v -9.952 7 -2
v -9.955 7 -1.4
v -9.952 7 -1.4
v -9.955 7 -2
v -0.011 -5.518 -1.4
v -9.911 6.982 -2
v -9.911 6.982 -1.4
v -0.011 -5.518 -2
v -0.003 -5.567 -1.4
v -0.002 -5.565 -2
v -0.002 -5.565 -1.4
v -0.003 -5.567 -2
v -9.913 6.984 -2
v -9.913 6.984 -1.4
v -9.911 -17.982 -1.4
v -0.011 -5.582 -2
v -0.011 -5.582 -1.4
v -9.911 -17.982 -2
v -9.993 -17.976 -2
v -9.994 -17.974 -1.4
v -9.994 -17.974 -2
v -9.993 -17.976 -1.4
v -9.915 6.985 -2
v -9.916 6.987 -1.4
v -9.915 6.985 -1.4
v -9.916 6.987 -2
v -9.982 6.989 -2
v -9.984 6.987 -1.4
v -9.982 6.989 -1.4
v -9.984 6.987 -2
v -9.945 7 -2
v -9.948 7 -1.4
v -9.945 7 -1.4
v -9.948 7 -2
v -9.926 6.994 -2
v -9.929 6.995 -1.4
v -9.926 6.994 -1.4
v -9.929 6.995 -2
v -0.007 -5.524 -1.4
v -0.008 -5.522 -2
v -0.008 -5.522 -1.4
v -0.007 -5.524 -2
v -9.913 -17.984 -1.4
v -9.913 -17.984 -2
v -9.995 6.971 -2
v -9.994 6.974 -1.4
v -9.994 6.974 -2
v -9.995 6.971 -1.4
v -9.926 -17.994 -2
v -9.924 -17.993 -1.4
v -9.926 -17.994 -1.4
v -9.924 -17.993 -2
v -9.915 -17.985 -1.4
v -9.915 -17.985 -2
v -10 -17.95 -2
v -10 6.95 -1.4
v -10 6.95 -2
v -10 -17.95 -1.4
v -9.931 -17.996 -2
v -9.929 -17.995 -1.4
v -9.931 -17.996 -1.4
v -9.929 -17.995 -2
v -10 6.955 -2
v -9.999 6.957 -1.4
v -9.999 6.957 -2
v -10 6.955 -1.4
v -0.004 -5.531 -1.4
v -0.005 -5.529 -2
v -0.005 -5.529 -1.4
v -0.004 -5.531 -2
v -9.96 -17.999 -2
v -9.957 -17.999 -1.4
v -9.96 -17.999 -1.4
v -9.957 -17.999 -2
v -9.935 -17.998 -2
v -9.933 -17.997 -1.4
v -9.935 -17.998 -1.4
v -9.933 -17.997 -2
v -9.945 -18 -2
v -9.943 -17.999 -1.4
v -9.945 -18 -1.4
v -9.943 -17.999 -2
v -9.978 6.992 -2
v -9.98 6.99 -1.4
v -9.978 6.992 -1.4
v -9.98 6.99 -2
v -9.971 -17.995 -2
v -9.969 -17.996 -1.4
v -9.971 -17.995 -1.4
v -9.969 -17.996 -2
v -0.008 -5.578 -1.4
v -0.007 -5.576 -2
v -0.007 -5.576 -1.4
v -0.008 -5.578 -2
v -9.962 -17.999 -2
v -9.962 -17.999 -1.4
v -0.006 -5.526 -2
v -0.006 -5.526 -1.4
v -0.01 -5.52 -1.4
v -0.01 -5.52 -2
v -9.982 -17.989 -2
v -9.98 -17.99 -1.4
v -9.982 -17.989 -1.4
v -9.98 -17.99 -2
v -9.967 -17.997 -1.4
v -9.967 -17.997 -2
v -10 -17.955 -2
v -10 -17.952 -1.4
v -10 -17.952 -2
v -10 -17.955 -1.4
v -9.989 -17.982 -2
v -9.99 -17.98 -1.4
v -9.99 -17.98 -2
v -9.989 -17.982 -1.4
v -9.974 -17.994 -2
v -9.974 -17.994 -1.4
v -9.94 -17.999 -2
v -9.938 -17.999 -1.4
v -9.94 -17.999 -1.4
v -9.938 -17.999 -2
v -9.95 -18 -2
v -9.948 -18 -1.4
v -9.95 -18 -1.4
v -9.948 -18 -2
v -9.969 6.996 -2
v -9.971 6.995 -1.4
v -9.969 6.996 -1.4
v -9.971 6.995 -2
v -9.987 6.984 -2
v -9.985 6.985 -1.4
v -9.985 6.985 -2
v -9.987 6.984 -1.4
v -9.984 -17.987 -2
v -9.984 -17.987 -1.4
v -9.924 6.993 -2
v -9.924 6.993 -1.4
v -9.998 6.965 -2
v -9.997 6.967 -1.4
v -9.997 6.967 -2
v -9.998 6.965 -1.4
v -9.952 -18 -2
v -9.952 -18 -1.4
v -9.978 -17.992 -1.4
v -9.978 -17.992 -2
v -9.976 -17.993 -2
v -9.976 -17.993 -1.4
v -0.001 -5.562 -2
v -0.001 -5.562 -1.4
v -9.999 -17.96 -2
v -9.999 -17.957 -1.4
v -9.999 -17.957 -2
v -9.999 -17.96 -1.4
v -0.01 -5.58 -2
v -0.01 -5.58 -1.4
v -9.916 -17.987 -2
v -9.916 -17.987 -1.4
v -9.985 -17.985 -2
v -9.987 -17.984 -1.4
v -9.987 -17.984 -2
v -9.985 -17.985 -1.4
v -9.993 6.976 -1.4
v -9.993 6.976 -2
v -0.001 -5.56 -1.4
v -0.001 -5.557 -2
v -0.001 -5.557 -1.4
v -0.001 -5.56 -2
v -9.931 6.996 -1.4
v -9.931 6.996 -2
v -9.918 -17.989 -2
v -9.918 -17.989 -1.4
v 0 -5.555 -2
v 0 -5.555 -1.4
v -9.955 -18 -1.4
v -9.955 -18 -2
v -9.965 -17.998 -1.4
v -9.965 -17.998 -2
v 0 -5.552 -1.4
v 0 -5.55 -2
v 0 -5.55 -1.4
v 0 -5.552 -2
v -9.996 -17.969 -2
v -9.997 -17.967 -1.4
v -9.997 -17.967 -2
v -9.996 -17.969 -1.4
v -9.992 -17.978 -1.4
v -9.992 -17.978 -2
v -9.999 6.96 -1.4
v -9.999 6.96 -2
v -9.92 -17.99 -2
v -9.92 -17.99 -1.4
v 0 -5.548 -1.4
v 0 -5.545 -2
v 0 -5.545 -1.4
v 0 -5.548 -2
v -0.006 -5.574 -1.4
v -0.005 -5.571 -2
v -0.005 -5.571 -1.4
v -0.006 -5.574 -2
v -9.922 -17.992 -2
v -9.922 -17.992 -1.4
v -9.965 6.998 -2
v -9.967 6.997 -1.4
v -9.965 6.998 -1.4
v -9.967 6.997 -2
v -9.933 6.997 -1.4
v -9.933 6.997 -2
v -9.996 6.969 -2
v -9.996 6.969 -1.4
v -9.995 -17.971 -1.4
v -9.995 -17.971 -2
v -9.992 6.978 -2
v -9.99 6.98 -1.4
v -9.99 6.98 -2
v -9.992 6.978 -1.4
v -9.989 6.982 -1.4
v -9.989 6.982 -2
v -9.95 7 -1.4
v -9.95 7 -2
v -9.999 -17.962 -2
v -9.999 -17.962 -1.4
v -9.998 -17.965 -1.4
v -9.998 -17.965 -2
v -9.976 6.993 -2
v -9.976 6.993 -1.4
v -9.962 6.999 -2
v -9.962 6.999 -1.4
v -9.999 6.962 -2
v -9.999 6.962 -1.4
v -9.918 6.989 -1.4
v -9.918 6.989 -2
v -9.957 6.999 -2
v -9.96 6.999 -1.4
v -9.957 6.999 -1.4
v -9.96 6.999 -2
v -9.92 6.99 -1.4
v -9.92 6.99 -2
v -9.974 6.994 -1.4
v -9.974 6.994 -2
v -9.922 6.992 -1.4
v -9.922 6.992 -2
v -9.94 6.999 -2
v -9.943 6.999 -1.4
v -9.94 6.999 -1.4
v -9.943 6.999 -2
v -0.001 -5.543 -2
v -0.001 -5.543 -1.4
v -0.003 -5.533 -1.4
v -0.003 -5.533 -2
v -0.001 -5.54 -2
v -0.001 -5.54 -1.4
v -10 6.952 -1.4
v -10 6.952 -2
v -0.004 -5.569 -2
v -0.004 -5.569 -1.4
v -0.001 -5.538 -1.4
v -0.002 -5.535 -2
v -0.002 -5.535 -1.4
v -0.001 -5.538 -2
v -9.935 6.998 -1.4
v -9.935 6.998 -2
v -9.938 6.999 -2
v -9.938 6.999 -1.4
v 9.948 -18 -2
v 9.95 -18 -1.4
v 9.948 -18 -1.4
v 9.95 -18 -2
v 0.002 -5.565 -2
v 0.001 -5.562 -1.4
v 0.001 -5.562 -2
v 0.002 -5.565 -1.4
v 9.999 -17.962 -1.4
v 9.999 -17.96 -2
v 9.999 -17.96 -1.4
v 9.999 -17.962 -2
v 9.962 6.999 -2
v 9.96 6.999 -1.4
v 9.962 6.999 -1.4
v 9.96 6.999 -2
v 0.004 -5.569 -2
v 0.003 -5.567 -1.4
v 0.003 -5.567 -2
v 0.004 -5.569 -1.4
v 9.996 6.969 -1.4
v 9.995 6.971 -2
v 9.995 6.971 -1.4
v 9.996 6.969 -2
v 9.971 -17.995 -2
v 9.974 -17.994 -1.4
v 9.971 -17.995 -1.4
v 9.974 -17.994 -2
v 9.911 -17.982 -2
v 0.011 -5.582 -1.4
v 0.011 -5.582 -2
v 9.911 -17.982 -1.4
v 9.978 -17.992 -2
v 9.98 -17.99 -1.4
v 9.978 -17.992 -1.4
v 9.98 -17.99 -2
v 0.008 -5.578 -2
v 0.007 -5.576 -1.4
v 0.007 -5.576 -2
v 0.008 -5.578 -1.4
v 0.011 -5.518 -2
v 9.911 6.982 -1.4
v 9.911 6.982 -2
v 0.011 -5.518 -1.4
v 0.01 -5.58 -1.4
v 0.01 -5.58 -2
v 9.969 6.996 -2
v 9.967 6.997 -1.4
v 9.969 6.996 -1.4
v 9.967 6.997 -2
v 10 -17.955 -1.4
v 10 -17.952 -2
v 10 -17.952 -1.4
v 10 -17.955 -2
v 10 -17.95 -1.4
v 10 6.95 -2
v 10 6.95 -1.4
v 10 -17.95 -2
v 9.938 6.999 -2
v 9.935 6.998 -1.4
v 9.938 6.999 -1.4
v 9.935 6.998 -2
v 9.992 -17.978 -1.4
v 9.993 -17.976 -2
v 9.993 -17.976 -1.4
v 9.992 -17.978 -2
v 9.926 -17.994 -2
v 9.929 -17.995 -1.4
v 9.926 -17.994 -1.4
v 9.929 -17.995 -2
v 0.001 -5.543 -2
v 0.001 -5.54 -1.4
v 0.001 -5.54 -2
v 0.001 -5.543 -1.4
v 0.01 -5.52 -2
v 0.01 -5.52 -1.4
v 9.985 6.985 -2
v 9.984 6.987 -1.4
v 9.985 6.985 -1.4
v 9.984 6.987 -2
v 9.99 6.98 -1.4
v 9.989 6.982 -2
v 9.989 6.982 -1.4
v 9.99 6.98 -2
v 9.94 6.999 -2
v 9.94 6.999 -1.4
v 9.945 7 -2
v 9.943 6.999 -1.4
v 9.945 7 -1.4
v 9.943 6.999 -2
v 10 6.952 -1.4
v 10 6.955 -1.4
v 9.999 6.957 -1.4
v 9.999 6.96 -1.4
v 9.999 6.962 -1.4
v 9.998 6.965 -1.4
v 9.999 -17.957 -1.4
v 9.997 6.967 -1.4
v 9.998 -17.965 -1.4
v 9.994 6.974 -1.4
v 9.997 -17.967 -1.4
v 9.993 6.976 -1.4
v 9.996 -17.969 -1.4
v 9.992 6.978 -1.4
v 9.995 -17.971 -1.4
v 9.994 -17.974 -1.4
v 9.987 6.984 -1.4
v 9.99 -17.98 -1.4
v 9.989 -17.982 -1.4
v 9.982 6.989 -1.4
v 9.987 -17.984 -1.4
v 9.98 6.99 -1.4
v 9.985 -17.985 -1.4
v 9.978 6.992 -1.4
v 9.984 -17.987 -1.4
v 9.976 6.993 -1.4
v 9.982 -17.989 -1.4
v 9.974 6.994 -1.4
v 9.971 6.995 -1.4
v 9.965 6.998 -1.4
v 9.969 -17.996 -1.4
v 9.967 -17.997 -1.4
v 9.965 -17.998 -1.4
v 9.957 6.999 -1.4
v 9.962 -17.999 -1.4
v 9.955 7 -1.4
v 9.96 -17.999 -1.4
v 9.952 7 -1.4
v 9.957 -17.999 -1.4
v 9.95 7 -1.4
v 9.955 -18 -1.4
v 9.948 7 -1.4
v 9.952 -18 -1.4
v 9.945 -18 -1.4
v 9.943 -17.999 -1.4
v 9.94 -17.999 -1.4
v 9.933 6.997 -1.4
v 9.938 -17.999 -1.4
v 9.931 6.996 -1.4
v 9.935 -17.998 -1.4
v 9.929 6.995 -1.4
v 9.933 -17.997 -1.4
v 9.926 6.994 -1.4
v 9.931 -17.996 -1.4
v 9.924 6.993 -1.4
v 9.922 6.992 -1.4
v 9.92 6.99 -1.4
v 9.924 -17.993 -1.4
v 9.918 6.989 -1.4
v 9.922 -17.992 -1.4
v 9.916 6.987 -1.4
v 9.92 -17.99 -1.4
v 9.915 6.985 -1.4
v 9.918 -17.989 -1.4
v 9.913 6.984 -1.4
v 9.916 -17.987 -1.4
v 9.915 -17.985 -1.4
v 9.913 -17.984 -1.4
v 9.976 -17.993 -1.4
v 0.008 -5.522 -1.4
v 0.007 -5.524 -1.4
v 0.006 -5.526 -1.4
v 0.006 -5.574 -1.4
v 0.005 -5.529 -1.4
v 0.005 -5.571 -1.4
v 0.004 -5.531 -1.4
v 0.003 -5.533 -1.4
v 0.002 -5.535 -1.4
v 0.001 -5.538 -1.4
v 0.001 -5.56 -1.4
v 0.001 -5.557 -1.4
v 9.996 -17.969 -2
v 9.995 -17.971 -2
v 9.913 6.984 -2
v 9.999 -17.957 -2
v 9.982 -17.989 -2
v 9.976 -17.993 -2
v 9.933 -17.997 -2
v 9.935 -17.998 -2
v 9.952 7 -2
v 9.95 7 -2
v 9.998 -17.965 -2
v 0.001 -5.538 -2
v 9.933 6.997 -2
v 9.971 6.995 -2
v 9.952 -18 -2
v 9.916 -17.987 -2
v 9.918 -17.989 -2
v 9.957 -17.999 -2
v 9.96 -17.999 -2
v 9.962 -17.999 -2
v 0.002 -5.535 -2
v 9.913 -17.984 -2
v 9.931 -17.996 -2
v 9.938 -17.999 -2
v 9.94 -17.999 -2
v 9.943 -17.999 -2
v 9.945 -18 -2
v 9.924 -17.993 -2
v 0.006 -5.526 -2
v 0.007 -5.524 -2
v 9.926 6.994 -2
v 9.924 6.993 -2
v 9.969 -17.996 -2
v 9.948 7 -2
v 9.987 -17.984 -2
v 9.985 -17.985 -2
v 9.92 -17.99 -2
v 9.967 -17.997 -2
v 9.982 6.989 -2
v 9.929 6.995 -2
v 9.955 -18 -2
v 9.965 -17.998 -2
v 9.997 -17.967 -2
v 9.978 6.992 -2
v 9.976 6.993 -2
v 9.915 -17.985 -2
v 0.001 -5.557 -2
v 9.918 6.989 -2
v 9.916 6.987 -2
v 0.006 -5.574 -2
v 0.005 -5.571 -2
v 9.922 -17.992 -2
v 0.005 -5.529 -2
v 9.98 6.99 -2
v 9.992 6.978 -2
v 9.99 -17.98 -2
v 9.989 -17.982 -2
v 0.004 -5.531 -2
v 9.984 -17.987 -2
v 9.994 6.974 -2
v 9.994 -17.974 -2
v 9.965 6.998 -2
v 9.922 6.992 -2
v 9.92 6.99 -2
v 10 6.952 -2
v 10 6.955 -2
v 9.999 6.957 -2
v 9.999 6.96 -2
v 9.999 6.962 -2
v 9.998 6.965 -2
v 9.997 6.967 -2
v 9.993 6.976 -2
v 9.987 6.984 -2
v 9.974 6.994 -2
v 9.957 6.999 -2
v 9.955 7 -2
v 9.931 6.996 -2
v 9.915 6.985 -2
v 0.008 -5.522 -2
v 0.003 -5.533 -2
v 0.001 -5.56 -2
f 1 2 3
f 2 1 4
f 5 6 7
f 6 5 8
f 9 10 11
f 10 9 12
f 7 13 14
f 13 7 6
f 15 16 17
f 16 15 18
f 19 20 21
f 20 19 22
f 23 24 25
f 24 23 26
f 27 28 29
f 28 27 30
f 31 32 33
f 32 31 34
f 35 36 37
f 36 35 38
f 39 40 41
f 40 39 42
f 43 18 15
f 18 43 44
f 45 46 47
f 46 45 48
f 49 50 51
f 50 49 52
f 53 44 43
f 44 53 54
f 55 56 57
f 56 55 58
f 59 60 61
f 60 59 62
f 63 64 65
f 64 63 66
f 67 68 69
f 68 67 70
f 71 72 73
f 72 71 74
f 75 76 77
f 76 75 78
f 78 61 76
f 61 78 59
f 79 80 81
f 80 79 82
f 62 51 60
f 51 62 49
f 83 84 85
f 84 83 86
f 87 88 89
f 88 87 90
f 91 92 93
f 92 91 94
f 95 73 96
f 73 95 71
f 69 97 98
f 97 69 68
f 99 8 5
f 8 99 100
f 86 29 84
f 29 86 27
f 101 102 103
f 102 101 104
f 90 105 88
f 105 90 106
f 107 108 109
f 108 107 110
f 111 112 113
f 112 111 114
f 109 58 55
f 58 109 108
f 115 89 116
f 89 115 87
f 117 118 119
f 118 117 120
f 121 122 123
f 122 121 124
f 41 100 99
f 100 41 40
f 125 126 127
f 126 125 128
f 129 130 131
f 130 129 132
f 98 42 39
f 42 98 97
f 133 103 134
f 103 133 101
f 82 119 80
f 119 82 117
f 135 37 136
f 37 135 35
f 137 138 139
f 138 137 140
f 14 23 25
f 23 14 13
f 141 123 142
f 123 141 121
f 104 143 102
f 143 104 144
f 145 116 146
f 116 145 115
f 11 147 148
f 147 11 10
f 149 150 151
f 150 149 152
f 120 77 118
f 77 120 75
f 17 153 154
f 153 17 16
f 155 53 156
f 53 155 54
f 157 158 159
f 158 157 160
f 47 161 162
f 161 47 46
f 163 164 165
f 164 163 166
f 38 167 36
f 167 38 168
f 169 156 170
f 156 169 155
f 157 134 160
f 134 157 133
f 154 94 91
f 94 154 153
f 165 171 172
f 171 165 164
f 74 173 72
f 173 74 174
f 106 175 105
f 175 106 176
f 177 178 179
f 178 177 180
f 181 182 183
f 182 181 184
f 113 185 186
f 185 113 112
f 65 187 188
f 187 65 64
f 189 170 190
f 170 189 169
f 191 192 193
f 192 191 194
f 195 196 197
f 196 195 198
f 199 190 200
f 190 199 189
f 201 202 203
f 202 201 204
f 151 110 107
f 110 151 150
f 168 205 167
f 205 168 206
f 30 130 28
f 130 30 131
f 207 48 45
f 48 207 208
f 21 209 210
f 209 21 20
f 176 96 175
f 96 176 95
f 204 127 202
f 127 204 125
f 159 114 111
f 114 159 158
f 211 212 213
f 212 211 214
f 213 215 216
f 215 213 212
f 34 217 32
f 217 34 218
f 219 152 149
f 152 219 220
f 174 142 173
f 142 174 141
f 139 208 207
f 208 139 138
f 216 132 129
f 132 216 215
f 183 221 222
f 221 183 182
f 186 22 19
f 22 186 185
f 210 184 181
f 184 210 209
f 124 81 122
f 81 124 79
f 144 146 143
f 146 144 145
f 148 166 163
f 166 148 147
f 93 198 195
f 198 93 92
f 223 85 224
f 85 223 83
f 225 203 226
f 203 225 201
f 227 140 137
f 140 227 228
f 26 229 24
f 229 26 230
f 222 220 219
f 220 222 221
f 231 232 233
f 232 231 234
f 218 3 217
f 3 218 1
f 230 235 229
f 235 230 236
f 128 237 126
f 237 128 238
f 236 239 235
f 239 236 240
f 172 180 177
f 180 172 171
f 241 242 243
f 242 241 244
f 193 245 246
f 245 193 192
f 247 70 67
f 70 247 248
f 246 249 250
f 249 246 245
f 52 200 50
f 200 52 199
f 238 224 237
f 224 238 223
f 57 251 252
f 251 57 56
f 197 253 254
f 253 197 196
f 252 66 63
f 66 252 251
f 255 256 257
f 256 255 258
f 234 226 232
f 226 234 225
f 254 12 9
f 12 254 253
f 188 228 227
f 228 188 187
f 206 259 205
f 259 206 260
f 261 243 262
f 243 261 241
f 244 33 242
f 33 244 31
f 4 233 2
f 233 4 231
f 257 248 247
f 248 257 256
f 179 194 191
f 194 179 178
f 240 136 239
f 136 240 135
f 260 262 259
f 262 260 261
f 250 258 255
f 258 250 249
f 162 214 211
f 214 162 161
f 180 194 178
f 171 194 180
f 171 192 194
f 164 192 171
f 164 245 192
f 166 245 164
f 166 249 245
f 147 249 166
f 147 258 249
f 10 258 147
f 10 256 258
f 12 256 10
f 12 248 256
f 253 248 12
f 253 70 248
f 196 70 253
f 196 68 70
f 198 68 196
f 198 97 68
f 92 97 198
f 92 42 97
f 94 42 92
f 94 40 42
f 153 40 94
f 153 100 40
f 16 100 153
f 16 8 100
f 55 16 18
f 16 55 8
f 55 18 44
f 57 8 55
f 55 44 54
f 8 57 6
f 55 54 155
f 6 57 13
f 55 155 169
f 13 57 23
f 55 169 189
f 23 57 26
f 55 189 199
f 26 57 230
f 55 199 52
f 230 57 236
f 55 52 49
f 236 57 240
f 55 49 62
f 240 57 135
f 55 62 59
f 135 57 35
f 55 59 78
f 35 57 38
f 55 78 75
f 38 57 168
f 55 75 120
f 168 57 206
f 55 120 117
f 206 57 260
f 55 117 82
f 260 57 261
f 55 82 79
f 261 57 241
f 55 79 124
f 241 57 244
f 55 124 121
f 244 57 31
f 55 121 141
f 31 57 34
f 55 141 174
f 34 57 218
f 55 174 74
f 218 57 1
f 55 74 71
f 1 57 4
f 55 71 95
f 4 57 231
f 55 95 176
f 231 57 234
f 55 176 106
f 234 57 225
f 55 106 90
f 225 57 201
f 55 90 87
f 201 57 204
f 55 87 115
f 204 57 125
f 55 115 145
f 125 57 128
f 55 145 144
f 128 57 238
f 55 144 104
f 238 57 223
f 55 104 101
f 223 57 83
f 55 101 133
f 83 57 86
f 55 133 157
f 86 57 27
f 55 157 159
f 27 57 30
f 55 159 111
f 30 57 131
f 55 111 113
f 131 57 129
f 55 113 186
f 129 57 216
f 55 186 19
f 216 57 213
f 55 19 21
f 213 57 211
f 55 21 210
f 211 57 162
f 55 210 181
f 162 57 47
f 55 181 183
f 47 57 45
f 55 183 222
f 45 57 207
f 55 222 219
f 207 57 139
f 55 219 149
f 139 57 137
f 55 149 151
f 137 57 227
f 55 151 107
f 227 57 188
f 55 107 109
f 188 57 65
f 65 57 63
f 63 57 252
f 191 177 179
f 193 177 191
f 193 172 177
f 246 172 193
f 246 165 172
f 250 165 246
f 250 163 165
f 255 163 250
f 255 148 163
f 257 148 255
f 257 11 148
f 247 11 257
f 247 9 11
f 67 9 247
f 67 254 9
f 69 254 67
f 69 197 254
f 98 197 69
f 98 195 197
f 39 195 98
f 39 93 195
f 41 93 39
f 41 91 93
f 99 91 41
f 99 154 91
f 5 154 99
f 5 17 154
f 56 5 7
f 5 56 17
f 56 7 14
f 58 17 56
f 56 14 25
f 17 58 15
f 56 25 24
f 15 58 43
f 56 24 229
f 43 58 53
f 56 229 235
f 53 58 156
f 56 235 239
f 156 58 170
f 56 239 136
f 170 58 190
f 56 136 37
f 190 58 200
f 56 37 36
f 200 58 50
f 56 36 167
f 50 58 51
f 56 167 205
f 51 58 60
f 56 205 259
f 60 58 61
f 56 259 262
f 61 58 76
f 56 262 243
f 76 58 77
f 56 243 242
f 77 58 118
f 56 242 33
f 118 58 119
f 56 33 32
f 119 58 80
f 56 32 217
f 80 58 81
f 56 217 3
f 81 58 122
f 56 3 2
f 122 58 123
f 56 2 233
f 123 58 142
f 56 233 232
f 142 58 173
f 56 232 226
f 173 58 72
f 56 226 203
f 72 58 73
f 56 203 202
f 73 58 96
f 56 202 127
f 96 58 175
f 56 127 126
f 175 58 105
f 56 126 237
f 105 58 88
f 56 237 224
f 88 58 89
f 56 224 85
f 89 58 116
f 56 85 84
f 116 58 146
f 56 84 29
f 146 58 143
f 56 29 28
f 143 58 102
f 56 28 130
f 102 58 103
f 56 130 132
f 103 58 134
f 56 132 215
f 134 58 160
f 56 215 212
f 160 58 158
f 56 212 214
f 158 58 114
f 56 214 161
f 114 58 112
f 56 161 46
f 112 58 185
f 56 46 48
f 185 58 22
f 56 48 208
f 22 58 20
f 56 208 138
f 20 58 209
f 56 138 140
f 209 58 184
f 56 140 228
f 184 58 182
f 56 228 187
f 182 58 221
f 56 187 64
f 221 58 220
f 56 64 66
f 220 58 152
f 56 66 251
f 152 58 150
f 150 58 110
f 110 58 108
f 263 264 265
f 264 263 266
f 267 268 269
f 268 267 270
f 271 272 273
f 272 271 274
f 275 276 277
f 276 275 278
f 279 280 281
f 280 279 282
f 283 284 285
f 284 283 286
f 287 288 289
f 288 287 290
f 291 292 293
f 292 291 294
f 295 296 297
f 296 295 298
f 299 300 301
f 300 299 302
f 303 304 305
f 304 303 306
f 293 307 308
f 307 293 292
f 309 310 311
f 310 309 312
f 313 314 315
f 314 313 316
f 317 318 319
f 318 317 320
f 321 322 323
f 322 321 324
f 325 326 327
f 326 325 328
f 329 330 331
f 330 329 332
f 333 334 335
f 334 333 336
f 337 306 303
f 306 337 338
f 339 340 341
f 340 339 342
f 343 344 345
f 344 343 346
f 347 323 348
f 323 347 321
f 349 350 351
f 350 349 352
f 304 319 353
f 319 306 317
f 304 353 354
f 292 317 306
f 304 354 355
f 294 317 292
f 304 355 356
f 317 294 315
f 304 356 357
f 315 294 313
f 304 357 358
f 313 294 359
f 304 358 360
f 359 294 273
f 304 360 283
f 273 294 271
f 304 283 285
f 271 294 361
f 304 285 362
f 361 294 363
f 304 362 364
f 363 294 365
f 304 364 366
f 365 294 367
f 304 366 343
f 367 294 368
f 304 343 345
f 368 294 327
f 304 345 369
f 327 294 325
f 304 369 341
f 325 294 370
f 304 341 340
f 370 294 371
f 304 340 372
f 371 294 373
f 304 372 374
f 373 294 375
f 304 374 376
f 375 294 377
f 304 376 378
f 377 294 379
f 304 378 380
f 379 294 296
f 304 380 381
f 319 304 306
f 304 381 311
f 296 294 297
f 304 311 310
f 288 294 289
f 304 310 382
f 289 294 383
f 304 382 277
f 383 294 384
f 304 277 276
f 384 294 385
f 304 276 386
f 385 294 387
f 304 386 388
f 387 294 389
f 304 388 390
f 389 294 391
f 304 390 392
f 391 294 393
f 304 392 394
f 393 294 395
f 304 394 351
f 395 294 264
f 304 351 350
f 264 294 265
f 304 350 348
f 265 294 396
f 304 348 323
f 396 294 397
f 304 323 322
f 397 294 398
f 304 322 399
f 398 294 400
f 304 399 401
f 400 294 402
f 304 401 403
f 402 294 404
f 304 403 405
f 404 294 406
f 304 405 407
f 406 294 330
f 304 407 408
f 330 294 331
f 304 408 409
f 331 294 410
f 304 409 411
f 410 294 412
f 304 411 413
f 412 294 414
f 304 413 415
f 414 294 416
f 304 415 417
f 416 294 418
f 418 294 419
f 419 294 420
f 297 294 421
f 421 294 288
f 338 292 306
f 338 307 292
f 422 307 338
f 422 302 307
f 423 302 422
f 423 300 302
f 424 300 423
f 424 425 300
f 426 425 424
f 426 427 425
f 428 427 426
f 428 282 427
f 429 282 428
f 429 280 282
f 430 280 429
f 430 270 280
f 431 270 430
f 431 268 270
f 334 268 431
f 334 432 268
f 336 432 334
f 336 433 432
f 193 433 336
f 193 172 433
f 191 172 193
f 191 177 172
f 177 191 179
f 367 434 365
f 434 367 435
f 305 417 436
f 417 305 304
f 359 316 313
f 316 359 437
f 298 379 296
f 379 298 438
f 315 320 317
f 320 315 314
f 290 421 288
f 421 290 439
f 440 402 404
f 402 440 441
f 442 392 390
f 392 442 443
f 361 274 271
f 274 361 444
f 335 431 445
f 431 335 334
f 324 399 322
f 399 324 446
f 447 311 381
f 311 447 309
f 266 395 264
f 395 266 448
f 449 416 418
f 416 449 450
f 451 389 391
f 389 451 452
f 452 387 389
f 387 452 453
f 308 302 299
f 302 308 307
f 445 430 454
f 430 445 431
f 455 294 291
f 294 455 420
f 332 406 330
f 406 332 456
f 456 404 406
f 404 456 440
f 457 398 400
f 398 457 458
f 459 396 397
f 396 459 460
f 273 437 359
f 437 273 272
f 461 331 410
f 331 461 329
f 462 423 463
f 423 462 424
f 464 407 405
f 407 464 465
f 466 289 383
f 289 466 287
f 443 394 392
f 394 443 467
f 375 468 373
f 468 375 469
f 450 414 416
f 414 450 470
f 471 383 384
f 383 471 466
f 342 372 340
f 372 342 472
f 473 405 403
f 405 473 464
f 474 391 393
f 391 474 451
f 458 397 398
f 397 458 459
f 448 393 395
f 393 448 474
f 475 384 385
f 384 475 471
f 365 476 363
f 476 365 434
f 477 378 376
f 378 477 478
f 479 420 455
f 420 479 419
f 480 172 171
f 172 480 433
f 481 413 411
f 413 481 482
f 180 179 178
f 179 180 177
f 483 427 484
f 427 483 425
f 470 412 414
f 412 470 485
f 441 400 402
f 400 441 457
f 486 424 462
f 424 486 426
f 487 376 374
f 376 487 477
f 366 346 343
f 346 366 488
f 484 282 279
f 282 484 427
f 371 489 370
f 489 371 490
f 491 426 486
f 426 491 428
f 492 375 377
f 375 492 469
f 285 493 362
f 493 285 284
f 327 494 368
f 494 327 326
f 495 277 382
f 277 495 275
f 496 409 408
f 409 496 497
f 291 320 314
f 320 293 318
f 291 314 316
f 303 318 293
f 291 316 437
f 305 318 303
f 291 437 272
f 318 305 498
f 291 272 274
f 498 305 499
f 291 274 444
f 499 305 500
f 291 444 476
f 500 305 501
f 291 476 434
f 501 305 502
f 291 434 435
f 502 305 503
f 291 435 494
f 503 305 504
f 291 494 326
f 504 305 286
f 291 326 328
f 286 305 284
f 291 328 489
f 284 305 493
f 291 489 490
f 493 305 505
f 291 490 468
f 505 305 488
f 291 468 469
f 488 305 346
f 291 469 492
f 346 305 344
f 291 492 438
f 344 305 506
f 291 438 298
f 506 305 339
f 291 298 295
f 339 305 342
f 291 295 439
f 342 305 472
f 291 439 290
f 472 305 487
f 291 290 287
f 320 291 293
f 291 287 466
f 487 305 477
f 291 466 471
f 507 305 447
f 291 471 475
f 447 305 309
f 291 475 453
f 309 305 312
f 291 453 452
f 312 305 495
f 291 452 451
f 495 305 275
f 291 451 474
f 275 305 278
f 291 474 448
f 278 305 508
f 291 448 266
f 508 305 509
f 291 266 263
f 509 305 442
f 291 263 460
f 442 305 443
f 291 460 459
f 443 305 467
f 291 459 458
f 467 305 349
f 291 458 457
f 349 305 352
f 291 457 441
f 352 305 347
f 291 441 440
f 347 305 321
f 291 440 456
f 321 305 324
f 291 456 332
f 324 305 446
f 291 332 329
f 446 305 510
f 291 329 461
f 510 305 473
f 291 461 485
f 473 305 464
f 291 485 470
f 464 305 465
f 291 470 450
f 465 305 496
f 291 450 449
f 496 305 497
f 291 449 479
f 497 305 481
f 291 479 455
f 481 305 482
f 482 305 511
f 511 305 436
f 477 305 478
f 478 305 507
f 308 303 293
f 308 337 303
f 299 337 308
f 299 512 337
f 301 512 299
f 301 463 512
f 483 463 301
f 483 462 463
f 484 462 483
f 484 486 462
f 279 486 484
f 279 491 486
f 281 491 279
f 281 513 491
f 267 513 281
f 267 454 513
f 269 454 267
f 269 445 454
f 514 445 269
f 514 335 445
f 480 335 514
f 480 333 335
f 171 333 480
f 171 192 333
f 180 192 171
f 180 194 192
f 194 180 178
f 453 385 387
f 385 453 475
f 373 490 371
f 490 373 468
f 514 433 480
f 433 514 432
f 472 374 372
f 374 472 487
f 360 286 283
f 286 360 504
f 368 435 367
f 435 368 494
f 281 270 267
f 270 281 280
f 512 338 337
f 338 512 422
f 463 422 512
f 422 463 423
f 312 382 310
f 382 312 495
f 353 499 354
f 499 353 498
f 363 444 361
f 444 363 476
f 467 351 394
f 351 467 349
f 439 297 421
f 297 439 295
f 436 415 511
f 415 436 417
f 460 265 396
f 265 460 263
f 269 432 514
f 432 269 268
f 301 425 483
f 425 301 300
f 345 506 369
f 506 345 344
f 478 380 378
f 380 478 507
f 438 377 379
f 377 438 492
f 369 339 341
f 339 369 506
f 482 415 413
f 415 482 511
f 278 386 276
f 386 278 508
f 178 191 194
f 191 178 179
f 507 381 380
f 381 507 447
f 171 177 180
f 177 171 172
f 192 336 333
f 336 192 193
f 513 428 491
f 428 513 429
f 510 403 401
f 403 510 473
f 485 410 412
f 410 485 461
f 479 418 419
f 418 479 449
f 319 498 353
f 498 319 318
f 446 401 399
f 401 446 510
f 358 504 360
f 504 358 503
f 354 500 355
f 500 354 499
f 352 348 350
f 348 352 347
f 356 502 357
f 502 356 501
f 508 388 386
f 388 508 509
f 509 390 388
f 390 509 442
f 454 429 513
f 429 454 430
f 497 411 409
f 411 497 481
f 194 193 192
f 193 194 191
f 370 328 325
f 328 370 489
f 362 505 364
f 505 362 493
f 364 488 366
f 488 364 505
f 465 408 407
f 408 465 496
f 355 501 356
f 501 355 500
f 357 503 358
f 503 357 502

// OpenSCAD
// Copyright 2020 Martin Scheidt (Attribution 4.0 International, CC-BY 4.0)
//
// You are free to copy and redistribute the material in any medium or format.
// You are free to remix, transform, and build upon the material for any purpose, even commercially.
// You must give appropriate credit, provide a link to the license, and indicate if changes were made.
// You may not apply legal terms or technological measures that legally restrict others from doing anything the license permits.
// No warranties are given.

include<config.scad>

//coupler("back");
train_tail_symbol();
//train_headlight_symbol();

//triangle();
//train_headlight_symbol();
//cube([shield_width, shield_depth, shield_thickness]);
module triangle(){
    cylinder_diameter = 0.1;
    hull(){
        translate([cylinder_diameter/2,cylinder_diameter/2,0])cylinder(d=cylinder_diameter, h=number_height);
        translate([cylinder_diameter/2, shield_depth-cylinder_diameter/2,0]) cylinder(d=cylinder_diameter, h=number_height);
        translate([(shield_width-cylinder_diameter)/2, (shield_depth-cylinder_diameter)/2,0])cylinder(d=cylinder_diameter, h=number_height);
    }
}

module train_headlight_symbol(){
    translate([-shield_width/2,-(shield_depth)/2-coupling_radius+1,-shield_thickness]) union(){
        translate([(1/12)*shield_width+headlight_d/2,(shield_depth+(1/6)*shield_width+headlight_d)/2,0]) cylinder(d= headlight_d, h=number_height);
        translate([(11/12)*shield_width-headlight_d/2,(shield_depth+(1/6)*shield_width+headlight_d)/2,0]) cylinder(d= headlight_d, h=number_height);
        translate([(1/2)*shield_width,(shield_depth-(1/6)*shield_width-headlight_d)/2,0]) cylinder(d= headlight_d, h=number_height);
    }

}

module train_tail_symbol(){
    translate([-shield_width/2,-(shield_depth)/2-coupling_radius+1,-shield_thickness]) triangle();
    translate([shield_width/2,-(shield_depth)/2-coupling_radius+1,-shield_thickness+number_height]) rotate([0,180,0]) triangle();
}



module coupler(position){
    difference(){ // coupling
        // outer ring
        cylinder(h = coupling_depth, r = coupling_radius + move_tolerance/2 + coupler_thickness);
        // inner ring
        translate([0,0,-coupler_thickness/2]) cylinder(h = coupling_depth + coupler_thickness, r = coupling_radius + move_tolerance/2);
        // cutting the lower edge
        translate([-coupling_radius*1.3,coupling_cut_pos,-coupler_thickness/2]) cube([coupling_radius*2.6,coupling_radius*1.2,coupling_depth + coupler_thickness]);
    }

    union(){// upper board
        // beam
        translate([-boogie_width/2,-(coupling_radius + coupler_thickness + move_tolerance/2),0]) cube([boogie_width,coupler_thickness,coupling_depth]);
        // lipp
        hull(){
            translate([-boogie_width/2,-(coupling_radius + move_tolerance/2 + coupler_thickness - lipp_width),coupling_depth]) cube([boogie_width,thinnest_layer,lipp_height/4]);
            translate([-boogie_width/2,-(coupling_radius + move_tolerance/2 + coupler_thickness),coupling_depth]) cube([boogie_width,thinnest_layer,lipp_height]);
        }
    }

    /* difference(){// old front shield
        union(){
            #hull(){
                // plate - upper part
                translate([-boogie_width/2,-(coupling_radius + coupler_thickness + move_tolerance/2),-shield_thickness]) cube([boogie_width,coupler_thickness,shield_thickness]);
                // plate - lower part
                difference(){
                    translate([0,0,-shield_thickness]) cylinder(h = shield_thickness, r = coupling_radius + move_tolerance/2 + coupler_thickness);
                    translate([-coupling_radius*1.3,coupling_cut_pos,-shield_thickness]) cube([coupling_radius*2.6,coupling_radius*1.2,shield_thickness]);
                }
                translate([0,0,-shield_thickness]) cylinder(h = shield_thickness, r = coupling_radius + move_tolerance/2);
            }
        }
        // inlay
        #translate([0,0,-inlay_thickness]) cylinder(h = inlay_thickness*1.1, r = inlay_radius);
    } */

    difference(){ // new front shield
        translate([-shield_width/2,-(shield_depth)/2-coupling_radius+1,-shield_thickness]) cube([shield_width, shield_depth, shield_thickness]);
        translate([0,0,-inlay_thickness]) cylinder(h = inlay_thickness*1.1, r = inlay_radius);
        if (position == "back"){
            train_tail_symbol();
        }
        if (position == "front"){
           train_headlight_symbol(); 
        }
    }
}
